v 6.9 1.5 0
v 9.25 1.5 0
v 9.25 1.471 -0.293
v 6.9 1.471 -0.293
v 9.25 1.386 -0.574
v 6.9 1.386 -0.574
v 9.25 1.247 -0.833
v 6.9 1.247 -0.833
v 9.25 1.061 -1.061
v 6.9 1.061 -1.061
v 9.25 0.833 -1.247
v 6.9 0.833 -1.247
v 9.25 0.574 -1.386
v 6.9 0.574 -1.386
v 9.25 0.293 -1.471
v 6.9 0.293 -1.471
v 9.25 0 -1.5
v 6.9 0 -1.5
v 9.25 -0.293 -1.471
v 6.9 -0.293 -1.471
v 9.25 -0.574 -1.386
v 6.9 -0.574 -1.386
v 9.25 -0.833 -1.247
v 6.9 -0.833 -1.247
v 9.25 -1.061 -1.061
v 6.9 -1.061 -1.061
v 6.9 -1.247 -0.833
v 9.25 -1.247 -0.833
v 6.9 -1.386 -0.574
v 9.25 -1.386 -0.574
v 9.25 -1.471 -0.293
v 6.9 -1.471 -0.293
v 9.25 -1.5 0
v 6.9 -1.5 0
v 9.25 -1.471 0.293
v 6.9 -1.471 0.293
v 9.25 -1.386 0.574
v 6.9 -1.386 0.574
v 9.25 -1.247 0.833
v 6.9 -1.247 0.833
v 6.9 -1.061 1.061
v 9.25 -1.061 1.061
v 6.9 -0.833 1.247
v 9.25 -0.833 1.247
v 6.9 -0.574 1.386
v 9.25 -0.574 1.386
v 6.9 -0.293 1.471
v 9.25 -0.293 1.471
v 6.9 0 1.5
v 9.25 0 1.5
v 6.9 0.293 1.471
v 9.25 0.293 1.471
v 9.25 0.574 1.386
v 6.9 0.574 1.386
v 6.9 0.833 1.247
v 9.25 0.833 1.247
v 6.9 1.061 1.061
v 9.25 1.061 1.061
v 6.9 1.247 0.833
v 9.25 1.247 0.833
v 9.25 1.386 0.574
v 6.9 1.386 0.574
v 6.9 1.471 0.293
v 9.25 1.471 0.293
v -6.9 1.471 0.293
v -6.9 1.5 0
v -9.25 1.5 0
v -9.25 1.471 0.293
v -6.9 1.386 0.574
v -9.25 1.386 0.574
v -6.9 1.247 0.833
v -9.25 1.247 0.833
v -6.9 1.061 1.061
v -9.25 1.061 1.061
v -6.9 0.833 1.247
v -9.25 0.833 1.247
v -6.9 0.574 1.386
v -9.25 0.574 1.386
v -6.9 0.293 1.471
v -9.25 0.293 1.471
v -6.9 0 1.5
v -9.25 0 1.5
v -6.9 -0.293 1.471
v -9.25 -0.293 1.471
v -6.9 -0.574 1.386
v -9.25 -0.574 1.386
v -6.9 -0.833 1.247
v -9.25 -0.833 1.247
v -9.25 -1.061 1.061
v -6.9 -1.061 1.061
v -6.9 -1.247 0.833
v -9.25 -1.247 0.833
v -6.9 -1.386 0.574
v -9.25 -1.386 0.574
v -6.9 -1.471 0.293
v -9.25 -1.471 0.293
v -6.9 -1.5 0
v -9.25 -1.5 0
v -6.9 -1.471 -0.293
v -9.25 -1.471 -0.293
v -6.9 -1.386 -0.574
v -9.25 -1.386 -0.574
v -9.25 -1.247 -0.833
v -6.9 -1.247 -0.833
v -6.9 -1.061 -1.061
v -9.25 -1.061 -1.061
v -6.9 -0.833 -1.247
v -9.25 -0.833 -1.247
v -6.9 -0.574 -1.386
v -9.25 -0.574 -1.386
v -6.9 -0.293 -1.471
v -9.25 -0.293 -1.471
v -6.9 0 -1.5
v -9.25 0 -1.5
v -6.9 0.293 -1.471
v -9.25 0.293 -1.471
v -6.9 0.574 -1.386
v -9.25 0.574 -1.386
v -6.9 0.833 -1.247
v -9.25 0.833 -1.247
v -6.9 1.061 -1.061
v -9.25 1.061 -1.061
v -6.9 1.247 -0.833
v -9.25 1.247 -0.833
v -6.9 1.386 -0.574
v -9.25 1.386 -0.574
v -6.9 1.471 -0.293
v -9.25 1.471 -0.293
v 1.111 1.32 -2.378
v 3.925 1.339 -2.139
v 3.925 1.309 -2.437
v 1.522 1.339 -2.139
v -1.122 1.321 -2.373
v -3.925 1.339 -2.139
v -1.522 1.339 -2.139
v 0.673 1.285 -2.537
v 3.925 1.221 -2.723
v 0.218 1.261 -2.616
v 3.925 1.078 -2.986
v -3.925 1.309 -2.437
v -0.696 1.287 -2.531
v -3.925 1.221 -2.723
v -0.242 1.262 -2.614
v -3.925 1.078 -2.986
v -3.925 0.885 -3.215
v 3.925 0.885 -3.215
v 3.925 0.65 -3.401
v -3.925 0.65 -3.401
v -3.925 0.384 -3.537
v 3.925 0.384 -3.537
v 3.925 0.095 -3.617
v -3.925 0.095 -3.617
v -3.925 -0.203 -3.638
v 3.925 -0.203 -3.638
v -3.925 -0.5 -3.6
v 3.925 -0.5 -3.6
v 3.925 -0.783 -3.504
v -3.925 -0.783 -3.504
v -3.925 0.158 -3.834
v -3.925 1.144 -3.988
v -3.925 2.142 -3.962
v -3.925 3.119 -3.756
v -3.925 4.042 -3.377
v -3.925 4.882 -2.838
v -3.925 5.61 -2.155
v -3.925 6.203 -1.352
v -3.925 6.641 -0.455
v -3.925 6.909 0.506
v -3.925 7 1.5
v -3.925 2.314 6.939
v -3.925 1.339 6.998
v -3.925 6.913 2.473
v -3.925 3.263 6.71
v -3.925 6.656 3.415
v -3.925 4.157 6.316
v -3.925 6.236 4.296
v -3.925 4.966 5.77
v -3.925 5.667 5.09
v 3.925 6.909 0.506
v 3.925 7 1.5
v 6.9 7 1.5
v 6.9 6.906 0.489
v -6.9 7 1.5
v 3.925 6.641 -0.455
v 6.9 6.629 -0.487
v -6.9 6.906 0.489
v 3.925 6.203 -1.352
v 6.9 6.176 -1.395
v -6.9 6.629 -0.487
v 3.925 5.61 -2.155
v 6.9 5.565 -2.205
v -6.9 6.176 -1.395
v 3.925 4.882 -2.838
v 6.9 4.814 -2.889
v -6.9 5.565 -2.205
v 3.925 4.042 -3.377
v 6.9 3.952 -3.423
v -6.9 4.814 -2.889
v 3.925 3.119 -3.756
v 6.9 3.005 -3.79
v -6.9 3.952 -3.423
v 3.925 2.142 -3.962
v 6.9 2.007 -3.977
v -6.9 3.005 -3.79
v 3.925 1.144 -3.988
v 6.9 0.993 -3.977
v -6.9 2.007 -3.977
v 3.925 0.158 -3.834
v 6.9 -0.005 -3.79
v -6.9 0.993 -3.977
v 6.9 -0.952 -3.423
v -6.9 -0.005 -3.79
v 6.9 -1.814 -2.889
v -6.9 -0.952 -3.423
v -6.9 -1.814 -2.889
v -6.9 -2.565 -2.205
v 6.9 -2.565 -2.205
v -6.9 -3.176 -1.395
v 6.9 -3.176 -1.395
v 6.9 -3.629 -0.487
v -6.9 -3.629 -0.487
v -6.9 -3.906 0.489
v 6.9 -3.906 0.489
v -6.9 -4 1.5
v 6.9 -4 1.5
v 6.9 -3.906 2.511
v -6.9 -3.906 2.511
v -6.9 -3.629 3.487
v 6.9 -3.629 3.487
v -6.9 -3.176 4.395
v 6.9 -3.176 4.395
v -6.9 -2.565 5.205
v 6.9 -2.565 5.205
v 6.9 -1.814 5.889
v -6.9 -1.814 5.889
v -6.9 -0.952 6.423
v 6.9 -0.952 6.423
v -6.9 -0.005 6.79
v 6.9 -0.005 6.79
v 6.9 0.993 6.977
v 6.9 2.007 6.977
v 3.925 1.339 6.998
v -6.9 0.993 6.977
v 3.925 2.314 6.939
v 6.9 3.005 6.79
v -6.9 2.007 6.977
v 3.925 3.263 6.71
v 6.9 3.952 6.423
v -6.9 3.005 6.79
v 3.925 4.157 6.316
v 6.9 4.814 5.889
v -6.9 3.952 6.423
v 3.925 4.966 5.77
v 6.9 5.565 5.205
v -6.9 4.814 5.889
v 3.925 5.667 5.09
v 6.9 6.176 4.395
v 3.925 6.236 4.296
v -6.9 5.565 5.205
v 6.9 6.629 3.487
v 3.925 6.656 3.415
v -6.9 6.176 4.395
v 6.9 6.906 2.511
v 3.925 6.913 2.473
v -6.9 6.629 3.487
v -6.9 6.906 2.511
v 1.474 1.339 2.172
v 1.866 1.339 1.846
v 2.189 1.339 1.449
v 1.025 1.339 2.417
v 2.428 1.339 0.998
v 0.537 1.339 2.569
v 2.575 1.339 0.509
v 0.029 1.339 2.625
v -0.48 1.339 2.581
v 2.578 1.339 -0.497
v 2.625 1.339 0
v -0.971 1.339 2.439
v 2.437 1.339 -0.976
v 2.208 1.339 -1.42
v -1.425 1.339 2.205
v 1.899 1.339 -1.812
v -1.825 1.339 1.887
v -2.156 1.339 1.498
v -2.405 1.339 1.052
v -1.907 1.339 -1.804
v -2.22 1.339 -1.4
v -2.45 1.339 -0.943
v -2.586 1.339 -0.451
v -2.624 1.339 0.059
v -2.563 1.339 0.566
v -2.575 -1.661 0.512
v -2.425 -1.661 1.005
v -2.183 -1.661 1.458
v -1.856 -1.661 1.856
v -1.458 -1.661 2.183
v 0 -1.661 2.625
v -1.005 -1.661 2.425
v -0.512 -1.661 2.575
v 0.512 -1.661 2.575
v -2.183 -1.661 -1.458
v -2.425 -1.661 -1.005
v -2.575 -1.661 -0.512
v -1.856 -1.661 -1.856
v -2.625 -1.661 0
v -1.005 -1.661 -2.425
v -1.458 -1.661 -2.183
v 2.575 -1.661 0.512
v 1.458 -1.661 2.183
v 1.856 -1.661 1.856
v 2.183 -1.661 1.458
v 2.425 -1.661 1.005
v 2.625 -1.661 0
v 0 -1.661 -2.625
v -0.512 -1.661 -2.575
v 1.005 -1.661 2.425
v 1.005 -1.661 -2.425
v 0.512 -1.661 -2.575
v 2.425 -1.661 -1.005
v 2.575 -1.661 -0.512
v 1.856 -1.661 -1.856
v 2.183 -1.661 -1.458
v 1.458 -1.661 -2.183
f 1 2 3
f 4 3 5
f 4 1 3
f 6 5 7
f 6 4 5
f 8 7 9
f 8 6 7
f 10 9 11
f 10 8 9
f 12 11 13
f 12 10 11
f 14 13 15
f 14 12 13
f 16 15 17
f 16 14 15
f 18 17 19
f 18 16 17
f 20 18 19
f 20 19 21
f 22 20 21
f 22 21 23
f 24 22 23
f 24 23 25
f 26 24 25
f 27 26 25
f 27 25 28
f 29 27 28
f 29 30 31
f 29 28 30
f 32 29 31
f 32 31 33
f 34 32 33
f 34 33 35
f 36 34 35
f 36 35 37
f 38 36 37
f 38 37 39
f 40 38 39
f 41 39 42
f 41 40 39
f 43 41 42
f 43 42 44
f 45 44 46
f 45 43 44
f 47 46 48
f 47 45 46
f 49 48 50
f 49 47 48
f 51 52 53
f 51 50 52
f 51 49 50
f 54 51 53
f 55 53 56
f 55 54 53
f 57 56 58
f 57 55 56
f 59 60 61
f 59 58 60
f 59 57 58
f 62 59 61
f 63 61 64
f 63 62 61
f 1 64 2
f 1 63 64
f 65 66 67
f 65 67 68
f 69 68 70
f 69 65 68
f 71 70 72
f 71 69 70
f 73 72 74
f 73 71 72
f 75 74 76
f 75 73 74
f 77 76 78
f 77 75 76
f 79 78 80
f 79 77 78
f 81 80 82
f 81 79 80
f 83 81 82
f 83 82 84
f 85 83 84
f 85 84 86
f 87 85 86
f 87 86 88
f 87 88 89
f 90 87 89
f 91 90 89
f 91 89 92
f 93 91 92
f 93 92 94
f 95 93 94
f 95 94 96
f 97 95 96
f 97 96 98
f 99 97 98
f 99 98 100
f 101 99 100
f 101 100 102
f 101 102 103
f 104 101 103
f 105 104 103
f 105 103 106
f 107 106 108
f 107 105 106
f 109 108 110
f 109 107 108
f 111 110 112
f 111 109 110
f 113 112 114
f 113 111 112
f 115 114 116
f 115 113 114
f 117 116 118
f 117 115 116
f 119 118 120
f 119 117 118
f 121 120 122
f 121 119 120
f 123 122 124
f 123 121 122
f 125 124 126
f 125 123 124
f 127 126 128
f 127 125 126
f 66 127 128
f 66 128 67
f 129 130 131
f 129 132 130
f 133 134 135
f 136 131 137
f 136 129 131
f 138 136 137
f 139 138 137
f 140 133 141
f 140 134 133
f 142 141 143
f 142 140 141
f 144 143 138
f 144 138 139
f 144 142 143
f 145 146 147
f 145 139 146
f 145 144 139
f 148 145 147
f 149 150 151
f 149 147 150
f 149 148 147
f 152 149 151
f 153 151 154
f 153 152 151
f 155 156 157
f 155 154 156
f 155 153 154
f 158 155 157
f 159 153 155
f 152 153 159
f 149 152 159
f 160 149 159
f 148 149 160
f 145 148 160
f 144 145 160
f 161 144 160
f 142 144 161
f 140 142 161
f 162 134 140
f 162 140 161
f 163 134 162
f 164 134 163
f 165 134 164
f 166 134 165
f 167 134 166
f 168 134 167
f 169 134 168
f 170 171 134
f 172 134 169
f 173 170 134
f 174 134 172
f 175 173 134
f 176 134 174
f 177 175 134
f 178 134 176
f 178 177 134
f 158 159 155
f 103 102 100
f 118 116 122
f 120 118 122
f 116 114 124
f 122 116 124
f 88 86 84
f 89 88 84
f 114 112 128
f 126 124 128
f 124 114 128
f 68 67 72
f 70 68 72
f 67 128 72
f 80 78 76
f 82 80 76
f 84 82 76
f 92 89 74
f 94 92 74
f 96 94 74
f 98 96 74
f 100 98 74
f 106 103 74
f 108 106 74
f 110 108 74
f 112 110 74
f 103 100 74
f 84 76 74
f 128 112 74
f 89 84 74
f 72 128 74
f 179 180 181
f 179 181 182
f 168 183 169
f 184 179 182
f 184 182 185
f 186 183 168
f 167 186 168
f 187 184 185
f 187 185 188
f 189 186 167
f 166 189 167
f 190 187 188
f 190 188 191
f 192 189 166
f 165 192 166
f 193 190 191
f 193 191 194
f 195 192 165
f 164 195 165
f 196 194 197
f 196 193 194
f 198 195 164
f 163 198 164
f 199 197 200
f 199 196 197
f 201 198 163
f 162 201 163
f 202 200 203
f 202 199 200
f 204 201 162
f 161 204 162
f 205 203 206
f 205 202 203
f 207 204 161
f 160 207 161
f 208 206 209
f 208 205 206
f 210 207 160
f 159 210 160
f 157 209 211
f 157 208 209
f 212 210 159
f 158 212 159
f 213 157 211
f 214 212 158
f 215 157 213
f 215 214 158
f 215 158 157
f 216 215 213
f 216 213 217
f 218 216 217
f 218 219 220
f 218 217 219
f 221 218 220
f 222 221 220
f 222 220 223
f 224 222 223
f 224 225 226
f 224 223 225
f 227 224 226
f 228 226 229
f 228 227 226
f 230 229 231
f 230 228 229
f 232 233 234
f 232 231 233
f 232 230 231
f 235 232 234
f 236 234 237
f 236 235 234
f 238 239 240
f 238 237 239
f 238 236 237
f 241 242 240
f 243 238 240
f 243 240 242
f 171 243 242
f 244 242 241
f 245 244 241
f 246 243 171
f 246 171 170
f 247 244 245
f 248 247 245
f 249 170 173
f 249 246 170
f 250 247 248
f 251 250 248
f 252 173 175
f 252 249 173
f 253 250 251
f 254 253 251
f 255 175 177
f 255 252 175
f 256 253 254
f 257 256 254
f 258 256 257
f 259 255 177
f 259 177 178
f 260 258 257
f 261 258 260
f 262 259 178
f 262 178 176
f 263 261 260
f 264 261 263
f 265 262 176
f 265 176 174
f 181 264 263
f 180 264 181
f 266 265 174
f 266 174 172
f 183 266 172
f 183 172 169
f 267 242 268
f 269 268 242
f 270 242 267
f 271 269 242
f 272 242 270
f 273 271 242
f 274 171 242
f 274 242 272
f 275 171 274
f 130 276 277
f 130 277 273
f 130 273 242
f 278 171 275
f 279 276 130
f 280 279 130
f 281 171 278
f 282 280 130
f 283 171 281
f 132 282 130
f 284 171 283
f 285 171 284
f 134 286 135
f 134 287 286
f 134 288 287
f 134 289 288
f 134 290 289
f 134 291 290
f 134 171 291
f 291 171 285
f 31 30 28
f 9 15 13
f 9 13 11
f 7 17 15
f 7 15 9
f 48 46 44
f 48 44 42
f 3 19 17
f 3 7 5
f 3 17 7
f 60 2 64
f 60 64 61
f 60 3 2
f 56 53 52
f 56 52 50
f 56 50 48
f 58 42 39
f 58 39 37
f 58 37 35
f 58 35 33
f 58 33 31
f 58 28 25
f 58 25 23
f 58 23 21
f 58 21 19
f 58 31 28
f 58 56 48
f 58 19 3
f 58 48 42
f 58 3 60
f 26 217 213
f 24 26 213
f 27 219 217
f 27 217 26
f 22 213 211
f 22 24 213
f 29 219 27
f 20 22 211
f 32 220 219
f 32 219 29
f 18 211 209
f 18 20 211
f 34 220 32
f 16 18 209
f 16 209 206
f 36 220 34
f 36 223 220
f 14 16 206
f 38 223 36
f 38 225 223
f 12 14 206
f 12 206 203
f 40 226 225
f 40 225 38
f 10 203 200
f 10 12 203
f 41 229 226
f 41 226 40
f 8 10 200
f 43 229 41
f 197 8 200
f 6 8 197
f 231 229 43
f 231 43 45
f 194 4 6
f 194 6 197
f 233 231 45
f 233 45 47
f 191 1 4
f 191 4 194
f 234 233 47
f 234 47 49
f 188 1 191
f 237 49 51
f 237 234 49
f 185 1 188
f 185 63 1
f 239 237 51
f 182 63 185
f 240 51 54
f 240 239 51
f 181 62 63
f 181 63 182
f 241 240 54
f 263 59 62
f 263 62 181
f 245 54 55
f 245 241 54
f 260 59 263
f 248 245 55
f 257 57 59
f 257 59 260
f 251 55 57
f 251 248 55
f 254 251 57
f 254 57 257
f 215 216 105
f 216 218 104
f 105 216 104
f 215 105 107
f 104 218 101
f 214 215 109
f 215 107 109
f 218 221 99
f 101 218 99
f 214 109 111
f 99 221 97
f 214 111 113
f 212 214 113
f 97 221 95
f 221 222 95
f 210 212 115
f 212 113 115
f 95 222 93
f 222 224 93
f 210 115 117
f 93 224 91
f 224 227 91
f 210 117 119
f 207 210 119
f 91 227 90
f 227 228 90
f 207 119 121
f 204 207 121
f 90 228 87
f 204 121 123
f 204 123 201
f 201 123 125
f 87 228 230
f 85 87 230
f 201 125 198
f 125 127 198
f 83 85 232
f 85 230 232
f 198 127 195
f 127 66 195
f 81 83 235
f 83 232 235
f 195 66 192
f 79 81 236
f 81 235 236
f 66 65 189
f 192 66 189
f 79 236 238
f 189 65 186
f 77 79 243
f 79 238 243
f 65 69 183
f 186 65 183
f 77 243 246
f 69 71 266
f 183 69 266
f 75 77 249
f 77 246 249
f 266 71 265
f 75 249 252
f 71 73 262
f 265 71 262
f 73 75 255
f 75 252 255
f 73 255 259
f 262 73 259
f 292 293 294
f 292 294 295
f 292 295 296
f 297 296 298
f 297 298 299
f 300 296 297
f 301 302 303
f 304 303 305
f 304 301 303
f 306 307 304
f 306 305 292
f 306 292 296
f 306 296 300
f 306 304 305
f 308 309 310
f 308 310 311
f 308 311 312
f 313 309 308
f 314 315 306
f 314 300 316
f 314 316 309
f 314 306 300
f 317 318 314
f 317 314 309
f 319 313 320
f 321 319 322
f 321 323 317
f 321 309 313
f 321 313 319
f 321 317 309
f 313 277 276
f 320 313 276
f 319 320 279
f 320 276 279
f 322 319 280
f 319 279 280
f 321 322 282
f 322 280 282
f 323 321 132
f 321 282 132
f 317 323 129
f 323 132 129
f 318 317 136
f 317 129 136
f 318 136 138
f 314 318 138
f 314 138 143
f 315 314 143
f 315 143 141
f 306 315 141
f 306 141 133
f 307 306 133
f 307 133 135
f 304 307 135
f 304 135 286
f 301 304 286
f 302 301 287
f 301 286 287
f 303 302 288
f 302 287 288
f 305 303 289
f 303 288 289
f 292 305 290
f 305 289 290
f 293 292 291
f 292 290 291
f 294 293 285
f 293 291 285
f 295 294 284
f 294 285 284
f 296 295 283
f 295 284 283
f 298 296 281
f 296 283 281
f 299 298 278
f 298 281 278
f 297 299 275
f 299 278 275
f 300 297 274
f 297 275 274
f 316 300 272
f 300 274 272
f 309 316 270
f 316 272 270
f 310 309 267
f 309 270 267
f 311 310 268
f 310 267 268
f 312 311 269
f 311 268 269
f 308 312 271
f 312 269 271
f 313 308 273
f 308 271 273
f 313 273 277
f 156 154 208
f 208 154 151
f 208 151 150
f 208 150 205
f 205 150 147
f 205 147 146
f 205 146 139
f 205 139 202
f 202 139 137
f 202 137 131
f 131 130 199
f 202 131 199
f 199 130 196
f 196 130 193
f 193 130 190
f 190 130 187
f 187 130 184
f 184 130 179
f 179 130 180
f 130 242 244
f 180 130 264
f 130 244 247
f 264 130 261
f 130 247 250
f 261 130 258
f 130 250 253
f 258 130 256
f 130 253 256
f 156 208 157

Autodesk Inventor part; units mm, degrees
ref_plane "YZ Plane" through (0, 0, 0) normal (1, 0, 0) x (0, 1, 0)
ref_plane "XZ Plane" through (0, 0, 0) normal (0, 1, 0) x (-1, 0, 0)
ref_plane "XY Plane" through (0, 0, 0) normal (0, 0, 1) x (1, 0, 0)
sketch "Sketch1" plane through (0, 0, 0) normal (1, 0, 0) x (0, 1, 0)
  circle A0 centre (0, 0) radius 1.5
  dimension "d0" = 3
extrude "Extrusion1" add sketch "Sketch1" along normal mid plane 18.5
sketch "Sketch2" plane through (0, 0, 0) normal (1, 0, 0) x (0, 1, 0)
  circle A0 centre (1.5, 1.5) radius 5.5
  point P0 (0, 0)
  dimension "cam_size" = 11
  dimension "top_ex" = 1.5
  dimension "d14" = 1.5
extrude "Extrusion2" add sketch "Sketch2" along normal mid plane 13.8
sketch "Sketch3" plane through (0, 0, 0) normal (1, 0, 0) x (0, 1, 0)
  circle A0 centre (1.5, 1.5) radius 5.5 projected
  line L0 (1.3393, 6.9977) -> (1.3393, -3.5197)
  circle A1 centre (-0.1607, -2.139) radius 1.5
  point P0 (0, 0)
  point P1 (1.3393, -2.139)
  point P2 (-0.7835, -3.5036)
  dimension "d8" = 3
extrude "Extrusion3" cut sketch "Sketch3" along normal mid plane 7.85 contours A0 A1 L0 picked at (1.7559, 3.9166)
sketch "Sketch4" plane through (-3.925, 1.3393, -2.139) normal (0, 1, 0) x (1, 0, 0)
  circle A0 centre (3.925, -2.139) radius 2.625
  line L0 (-5.325, -0.639) -> (-5.325, -3.639) projected
  point P0 (-5.325, -2.139)
  dimension "d11" = 5.25
extrude "Extrusion4" cut sketch "Sketch4" against normal blind 3
ref_plane "Work Plane1" through (0, 1.5, 1.5) normal (-1, 0, 0) x (0, 0, 1)
properties part number "custom_cam"
